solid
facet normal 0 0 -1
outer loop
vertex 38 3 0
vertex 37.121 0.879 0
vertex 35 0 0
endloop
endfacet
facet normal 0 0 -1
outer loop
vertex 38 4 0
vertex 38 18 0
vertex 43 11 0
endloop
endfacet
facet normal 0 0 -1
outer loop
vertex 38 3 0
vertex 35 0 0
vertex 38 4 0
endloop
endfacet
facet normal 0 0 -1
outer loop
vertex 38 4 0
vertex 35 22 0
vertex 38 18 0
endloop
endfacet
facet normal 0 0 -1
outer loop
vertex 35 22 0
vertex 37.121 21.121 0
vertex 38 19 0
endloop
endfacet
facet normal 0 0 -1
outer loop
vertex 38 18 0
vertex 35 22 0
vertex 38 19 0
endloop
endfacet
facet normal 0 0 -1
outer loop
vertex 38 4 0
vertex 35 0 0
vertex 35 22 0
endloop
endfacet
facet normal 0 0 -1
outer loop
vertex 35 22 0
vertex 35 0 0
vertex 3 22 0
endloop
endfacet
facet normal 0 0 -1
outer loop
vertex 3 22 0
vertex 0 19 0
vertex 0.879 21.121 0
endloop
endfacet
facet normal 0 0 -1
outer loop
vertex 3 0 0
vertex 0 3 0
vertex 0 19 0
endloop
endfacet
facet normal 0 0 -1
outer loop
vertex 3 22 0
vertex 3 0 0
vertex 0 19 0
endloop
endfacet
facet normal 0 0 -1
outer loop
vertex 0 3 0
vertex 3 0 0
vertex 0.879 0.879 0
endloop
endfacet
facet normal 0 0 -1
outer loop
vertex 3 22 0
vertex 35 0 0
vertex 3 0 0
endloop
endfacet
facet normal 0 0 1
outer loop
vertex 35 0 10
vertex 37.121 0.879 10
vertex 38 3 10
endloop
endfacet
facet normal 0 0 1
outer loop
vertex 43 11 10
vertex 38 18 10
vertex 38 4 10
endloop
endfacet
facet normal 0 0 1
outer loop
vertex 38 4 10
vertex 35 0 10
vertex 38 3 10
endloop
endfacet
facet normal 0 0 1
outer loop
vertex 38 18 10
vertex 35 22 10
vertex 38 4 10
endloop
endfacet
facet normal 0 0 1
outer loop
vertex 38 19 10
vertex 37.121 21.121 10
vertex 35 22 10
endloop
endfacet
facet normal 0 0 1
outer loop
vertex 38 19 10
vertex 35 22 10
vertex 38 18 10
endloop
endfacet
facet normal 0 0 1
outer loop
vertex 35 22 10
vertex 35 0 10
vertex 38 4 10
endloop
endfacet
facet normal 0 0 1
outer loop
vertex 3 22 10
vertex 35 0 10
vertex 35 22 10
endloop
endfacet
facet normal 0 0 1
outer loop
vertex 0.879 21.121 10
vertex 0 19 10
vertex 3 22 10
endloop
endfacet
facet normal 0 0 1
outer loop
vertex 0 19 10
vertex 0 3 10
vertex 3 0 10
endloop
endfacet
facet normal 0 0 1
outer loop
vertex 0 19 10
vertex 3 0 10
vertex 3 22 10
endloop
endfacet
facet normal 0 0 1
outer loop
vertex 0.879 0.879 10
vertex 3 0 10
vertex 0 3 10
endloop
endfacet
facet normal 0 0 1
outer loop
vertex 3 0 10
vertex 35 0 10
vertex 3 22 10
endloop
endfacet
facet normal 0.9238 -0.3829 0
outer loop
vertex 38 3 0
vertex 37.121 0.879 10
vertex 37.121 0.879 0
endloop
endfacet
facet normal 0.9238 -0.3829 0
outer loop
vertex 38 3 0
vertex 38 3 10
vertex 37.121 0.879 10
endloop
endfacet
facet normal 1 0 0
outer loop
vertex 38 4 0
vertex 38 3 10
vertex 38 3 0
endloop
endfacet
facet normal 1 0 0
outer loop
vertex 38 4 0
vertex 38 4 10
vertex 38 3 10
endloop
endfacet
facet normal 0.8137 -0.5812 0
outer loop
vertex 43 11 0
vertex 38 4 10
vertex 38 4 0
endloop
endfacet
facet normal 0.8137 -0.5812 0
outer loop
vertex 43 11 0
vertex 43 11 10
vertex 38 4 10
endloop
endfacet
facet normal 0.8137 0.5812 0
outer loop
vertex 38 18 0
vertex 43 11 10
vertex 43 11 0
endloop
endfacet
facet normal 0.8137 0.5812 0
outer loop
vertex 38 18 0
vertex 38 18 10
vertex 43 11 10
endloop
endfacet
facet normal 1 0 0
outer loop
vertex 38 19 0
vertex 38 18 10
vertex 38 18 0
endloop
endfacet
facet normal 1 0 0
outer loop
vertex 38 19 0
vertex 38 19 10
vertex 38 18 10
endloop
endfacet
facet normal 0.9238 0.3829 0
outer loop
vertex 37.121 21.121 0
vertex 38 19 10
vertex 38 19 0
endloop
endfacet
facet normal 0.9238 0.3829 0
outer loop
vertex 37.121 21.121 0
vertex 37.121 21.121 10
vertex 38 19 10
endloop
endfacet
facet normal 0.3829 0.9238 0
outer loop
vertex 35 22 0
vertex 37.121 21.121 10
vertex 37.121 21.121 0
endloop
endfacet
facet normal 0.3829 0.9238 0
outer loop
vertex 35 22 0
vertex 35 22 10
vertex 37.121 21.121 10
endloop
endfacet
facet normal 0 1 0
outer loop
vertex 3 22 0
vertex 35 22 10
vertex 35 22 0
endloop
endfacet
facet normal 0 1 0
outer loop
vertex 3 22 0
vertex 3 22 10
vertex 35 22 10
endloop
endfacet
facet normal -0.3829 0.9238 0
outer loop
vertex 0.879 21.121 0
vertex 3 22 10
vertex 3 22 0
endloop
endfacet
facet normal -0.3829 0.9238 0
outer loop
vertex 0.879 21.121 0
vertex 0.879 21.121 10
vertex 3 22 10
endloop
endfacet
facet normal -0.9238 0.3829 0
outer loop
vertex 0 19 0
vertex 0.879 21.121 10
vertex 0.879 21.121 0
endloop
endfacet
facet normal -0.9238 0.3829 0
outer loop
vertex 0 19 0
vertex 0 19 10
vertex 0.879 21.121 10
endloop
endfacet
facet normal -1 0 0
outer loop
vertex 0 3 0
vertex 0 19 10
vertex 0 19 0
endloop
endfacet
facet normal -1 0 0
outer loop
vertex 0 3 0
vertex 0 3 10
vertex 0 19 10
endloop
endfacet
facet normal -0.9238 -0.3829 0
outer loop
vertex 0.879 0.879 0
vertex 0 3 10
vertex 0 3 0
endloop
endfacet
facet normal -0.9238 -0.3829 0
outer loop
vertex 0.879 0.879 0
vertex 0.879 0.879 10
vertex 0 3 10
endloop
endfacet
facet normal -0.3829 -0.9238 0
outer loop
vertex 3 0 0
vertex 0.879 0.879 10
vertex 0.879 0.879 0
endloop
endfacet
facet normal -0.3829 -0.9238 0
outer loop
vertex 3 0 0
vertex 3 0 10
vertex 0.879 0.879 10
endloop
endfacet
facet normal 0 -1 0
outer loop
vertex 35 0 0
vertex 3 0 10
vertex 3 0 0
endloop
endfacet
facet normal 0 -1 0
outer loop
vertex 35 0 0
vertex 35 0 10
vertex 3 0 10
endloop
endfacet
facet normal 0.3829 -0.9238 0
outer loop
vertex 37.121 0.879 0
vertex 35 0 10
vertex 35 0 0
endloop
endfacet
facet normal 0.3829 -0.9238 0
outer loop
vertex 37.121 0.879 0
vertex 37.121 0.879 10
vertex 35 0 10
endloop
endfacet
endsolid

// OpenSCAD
$fn = 32;

// ----------------------------------------------------------------------
// Ratchet pawl: 38 x 22 mm body, beak 5 mm с правого торца
// ----------------------------------------------------------------------

// --- parameters (mm) ---
profile_height = 10;      // extrusion height
profile_points = 15;      // points of the closed outline

profile = [[0, 3], [0.879, 0.879], [3, 0], [35, 0], [37.121, 0.879], [38, 3], [38, 4], [43, 11], [38, 18], [38, 19], [37.121, 21.121], [35, 22], [3, 22], [0.879, 21.121], [0, 19]];  // single closed polygon, 15 points, counter clockwise

// --- the one profile operation ---
linear_extrude(height = profile_height) polygon(points = profile);
